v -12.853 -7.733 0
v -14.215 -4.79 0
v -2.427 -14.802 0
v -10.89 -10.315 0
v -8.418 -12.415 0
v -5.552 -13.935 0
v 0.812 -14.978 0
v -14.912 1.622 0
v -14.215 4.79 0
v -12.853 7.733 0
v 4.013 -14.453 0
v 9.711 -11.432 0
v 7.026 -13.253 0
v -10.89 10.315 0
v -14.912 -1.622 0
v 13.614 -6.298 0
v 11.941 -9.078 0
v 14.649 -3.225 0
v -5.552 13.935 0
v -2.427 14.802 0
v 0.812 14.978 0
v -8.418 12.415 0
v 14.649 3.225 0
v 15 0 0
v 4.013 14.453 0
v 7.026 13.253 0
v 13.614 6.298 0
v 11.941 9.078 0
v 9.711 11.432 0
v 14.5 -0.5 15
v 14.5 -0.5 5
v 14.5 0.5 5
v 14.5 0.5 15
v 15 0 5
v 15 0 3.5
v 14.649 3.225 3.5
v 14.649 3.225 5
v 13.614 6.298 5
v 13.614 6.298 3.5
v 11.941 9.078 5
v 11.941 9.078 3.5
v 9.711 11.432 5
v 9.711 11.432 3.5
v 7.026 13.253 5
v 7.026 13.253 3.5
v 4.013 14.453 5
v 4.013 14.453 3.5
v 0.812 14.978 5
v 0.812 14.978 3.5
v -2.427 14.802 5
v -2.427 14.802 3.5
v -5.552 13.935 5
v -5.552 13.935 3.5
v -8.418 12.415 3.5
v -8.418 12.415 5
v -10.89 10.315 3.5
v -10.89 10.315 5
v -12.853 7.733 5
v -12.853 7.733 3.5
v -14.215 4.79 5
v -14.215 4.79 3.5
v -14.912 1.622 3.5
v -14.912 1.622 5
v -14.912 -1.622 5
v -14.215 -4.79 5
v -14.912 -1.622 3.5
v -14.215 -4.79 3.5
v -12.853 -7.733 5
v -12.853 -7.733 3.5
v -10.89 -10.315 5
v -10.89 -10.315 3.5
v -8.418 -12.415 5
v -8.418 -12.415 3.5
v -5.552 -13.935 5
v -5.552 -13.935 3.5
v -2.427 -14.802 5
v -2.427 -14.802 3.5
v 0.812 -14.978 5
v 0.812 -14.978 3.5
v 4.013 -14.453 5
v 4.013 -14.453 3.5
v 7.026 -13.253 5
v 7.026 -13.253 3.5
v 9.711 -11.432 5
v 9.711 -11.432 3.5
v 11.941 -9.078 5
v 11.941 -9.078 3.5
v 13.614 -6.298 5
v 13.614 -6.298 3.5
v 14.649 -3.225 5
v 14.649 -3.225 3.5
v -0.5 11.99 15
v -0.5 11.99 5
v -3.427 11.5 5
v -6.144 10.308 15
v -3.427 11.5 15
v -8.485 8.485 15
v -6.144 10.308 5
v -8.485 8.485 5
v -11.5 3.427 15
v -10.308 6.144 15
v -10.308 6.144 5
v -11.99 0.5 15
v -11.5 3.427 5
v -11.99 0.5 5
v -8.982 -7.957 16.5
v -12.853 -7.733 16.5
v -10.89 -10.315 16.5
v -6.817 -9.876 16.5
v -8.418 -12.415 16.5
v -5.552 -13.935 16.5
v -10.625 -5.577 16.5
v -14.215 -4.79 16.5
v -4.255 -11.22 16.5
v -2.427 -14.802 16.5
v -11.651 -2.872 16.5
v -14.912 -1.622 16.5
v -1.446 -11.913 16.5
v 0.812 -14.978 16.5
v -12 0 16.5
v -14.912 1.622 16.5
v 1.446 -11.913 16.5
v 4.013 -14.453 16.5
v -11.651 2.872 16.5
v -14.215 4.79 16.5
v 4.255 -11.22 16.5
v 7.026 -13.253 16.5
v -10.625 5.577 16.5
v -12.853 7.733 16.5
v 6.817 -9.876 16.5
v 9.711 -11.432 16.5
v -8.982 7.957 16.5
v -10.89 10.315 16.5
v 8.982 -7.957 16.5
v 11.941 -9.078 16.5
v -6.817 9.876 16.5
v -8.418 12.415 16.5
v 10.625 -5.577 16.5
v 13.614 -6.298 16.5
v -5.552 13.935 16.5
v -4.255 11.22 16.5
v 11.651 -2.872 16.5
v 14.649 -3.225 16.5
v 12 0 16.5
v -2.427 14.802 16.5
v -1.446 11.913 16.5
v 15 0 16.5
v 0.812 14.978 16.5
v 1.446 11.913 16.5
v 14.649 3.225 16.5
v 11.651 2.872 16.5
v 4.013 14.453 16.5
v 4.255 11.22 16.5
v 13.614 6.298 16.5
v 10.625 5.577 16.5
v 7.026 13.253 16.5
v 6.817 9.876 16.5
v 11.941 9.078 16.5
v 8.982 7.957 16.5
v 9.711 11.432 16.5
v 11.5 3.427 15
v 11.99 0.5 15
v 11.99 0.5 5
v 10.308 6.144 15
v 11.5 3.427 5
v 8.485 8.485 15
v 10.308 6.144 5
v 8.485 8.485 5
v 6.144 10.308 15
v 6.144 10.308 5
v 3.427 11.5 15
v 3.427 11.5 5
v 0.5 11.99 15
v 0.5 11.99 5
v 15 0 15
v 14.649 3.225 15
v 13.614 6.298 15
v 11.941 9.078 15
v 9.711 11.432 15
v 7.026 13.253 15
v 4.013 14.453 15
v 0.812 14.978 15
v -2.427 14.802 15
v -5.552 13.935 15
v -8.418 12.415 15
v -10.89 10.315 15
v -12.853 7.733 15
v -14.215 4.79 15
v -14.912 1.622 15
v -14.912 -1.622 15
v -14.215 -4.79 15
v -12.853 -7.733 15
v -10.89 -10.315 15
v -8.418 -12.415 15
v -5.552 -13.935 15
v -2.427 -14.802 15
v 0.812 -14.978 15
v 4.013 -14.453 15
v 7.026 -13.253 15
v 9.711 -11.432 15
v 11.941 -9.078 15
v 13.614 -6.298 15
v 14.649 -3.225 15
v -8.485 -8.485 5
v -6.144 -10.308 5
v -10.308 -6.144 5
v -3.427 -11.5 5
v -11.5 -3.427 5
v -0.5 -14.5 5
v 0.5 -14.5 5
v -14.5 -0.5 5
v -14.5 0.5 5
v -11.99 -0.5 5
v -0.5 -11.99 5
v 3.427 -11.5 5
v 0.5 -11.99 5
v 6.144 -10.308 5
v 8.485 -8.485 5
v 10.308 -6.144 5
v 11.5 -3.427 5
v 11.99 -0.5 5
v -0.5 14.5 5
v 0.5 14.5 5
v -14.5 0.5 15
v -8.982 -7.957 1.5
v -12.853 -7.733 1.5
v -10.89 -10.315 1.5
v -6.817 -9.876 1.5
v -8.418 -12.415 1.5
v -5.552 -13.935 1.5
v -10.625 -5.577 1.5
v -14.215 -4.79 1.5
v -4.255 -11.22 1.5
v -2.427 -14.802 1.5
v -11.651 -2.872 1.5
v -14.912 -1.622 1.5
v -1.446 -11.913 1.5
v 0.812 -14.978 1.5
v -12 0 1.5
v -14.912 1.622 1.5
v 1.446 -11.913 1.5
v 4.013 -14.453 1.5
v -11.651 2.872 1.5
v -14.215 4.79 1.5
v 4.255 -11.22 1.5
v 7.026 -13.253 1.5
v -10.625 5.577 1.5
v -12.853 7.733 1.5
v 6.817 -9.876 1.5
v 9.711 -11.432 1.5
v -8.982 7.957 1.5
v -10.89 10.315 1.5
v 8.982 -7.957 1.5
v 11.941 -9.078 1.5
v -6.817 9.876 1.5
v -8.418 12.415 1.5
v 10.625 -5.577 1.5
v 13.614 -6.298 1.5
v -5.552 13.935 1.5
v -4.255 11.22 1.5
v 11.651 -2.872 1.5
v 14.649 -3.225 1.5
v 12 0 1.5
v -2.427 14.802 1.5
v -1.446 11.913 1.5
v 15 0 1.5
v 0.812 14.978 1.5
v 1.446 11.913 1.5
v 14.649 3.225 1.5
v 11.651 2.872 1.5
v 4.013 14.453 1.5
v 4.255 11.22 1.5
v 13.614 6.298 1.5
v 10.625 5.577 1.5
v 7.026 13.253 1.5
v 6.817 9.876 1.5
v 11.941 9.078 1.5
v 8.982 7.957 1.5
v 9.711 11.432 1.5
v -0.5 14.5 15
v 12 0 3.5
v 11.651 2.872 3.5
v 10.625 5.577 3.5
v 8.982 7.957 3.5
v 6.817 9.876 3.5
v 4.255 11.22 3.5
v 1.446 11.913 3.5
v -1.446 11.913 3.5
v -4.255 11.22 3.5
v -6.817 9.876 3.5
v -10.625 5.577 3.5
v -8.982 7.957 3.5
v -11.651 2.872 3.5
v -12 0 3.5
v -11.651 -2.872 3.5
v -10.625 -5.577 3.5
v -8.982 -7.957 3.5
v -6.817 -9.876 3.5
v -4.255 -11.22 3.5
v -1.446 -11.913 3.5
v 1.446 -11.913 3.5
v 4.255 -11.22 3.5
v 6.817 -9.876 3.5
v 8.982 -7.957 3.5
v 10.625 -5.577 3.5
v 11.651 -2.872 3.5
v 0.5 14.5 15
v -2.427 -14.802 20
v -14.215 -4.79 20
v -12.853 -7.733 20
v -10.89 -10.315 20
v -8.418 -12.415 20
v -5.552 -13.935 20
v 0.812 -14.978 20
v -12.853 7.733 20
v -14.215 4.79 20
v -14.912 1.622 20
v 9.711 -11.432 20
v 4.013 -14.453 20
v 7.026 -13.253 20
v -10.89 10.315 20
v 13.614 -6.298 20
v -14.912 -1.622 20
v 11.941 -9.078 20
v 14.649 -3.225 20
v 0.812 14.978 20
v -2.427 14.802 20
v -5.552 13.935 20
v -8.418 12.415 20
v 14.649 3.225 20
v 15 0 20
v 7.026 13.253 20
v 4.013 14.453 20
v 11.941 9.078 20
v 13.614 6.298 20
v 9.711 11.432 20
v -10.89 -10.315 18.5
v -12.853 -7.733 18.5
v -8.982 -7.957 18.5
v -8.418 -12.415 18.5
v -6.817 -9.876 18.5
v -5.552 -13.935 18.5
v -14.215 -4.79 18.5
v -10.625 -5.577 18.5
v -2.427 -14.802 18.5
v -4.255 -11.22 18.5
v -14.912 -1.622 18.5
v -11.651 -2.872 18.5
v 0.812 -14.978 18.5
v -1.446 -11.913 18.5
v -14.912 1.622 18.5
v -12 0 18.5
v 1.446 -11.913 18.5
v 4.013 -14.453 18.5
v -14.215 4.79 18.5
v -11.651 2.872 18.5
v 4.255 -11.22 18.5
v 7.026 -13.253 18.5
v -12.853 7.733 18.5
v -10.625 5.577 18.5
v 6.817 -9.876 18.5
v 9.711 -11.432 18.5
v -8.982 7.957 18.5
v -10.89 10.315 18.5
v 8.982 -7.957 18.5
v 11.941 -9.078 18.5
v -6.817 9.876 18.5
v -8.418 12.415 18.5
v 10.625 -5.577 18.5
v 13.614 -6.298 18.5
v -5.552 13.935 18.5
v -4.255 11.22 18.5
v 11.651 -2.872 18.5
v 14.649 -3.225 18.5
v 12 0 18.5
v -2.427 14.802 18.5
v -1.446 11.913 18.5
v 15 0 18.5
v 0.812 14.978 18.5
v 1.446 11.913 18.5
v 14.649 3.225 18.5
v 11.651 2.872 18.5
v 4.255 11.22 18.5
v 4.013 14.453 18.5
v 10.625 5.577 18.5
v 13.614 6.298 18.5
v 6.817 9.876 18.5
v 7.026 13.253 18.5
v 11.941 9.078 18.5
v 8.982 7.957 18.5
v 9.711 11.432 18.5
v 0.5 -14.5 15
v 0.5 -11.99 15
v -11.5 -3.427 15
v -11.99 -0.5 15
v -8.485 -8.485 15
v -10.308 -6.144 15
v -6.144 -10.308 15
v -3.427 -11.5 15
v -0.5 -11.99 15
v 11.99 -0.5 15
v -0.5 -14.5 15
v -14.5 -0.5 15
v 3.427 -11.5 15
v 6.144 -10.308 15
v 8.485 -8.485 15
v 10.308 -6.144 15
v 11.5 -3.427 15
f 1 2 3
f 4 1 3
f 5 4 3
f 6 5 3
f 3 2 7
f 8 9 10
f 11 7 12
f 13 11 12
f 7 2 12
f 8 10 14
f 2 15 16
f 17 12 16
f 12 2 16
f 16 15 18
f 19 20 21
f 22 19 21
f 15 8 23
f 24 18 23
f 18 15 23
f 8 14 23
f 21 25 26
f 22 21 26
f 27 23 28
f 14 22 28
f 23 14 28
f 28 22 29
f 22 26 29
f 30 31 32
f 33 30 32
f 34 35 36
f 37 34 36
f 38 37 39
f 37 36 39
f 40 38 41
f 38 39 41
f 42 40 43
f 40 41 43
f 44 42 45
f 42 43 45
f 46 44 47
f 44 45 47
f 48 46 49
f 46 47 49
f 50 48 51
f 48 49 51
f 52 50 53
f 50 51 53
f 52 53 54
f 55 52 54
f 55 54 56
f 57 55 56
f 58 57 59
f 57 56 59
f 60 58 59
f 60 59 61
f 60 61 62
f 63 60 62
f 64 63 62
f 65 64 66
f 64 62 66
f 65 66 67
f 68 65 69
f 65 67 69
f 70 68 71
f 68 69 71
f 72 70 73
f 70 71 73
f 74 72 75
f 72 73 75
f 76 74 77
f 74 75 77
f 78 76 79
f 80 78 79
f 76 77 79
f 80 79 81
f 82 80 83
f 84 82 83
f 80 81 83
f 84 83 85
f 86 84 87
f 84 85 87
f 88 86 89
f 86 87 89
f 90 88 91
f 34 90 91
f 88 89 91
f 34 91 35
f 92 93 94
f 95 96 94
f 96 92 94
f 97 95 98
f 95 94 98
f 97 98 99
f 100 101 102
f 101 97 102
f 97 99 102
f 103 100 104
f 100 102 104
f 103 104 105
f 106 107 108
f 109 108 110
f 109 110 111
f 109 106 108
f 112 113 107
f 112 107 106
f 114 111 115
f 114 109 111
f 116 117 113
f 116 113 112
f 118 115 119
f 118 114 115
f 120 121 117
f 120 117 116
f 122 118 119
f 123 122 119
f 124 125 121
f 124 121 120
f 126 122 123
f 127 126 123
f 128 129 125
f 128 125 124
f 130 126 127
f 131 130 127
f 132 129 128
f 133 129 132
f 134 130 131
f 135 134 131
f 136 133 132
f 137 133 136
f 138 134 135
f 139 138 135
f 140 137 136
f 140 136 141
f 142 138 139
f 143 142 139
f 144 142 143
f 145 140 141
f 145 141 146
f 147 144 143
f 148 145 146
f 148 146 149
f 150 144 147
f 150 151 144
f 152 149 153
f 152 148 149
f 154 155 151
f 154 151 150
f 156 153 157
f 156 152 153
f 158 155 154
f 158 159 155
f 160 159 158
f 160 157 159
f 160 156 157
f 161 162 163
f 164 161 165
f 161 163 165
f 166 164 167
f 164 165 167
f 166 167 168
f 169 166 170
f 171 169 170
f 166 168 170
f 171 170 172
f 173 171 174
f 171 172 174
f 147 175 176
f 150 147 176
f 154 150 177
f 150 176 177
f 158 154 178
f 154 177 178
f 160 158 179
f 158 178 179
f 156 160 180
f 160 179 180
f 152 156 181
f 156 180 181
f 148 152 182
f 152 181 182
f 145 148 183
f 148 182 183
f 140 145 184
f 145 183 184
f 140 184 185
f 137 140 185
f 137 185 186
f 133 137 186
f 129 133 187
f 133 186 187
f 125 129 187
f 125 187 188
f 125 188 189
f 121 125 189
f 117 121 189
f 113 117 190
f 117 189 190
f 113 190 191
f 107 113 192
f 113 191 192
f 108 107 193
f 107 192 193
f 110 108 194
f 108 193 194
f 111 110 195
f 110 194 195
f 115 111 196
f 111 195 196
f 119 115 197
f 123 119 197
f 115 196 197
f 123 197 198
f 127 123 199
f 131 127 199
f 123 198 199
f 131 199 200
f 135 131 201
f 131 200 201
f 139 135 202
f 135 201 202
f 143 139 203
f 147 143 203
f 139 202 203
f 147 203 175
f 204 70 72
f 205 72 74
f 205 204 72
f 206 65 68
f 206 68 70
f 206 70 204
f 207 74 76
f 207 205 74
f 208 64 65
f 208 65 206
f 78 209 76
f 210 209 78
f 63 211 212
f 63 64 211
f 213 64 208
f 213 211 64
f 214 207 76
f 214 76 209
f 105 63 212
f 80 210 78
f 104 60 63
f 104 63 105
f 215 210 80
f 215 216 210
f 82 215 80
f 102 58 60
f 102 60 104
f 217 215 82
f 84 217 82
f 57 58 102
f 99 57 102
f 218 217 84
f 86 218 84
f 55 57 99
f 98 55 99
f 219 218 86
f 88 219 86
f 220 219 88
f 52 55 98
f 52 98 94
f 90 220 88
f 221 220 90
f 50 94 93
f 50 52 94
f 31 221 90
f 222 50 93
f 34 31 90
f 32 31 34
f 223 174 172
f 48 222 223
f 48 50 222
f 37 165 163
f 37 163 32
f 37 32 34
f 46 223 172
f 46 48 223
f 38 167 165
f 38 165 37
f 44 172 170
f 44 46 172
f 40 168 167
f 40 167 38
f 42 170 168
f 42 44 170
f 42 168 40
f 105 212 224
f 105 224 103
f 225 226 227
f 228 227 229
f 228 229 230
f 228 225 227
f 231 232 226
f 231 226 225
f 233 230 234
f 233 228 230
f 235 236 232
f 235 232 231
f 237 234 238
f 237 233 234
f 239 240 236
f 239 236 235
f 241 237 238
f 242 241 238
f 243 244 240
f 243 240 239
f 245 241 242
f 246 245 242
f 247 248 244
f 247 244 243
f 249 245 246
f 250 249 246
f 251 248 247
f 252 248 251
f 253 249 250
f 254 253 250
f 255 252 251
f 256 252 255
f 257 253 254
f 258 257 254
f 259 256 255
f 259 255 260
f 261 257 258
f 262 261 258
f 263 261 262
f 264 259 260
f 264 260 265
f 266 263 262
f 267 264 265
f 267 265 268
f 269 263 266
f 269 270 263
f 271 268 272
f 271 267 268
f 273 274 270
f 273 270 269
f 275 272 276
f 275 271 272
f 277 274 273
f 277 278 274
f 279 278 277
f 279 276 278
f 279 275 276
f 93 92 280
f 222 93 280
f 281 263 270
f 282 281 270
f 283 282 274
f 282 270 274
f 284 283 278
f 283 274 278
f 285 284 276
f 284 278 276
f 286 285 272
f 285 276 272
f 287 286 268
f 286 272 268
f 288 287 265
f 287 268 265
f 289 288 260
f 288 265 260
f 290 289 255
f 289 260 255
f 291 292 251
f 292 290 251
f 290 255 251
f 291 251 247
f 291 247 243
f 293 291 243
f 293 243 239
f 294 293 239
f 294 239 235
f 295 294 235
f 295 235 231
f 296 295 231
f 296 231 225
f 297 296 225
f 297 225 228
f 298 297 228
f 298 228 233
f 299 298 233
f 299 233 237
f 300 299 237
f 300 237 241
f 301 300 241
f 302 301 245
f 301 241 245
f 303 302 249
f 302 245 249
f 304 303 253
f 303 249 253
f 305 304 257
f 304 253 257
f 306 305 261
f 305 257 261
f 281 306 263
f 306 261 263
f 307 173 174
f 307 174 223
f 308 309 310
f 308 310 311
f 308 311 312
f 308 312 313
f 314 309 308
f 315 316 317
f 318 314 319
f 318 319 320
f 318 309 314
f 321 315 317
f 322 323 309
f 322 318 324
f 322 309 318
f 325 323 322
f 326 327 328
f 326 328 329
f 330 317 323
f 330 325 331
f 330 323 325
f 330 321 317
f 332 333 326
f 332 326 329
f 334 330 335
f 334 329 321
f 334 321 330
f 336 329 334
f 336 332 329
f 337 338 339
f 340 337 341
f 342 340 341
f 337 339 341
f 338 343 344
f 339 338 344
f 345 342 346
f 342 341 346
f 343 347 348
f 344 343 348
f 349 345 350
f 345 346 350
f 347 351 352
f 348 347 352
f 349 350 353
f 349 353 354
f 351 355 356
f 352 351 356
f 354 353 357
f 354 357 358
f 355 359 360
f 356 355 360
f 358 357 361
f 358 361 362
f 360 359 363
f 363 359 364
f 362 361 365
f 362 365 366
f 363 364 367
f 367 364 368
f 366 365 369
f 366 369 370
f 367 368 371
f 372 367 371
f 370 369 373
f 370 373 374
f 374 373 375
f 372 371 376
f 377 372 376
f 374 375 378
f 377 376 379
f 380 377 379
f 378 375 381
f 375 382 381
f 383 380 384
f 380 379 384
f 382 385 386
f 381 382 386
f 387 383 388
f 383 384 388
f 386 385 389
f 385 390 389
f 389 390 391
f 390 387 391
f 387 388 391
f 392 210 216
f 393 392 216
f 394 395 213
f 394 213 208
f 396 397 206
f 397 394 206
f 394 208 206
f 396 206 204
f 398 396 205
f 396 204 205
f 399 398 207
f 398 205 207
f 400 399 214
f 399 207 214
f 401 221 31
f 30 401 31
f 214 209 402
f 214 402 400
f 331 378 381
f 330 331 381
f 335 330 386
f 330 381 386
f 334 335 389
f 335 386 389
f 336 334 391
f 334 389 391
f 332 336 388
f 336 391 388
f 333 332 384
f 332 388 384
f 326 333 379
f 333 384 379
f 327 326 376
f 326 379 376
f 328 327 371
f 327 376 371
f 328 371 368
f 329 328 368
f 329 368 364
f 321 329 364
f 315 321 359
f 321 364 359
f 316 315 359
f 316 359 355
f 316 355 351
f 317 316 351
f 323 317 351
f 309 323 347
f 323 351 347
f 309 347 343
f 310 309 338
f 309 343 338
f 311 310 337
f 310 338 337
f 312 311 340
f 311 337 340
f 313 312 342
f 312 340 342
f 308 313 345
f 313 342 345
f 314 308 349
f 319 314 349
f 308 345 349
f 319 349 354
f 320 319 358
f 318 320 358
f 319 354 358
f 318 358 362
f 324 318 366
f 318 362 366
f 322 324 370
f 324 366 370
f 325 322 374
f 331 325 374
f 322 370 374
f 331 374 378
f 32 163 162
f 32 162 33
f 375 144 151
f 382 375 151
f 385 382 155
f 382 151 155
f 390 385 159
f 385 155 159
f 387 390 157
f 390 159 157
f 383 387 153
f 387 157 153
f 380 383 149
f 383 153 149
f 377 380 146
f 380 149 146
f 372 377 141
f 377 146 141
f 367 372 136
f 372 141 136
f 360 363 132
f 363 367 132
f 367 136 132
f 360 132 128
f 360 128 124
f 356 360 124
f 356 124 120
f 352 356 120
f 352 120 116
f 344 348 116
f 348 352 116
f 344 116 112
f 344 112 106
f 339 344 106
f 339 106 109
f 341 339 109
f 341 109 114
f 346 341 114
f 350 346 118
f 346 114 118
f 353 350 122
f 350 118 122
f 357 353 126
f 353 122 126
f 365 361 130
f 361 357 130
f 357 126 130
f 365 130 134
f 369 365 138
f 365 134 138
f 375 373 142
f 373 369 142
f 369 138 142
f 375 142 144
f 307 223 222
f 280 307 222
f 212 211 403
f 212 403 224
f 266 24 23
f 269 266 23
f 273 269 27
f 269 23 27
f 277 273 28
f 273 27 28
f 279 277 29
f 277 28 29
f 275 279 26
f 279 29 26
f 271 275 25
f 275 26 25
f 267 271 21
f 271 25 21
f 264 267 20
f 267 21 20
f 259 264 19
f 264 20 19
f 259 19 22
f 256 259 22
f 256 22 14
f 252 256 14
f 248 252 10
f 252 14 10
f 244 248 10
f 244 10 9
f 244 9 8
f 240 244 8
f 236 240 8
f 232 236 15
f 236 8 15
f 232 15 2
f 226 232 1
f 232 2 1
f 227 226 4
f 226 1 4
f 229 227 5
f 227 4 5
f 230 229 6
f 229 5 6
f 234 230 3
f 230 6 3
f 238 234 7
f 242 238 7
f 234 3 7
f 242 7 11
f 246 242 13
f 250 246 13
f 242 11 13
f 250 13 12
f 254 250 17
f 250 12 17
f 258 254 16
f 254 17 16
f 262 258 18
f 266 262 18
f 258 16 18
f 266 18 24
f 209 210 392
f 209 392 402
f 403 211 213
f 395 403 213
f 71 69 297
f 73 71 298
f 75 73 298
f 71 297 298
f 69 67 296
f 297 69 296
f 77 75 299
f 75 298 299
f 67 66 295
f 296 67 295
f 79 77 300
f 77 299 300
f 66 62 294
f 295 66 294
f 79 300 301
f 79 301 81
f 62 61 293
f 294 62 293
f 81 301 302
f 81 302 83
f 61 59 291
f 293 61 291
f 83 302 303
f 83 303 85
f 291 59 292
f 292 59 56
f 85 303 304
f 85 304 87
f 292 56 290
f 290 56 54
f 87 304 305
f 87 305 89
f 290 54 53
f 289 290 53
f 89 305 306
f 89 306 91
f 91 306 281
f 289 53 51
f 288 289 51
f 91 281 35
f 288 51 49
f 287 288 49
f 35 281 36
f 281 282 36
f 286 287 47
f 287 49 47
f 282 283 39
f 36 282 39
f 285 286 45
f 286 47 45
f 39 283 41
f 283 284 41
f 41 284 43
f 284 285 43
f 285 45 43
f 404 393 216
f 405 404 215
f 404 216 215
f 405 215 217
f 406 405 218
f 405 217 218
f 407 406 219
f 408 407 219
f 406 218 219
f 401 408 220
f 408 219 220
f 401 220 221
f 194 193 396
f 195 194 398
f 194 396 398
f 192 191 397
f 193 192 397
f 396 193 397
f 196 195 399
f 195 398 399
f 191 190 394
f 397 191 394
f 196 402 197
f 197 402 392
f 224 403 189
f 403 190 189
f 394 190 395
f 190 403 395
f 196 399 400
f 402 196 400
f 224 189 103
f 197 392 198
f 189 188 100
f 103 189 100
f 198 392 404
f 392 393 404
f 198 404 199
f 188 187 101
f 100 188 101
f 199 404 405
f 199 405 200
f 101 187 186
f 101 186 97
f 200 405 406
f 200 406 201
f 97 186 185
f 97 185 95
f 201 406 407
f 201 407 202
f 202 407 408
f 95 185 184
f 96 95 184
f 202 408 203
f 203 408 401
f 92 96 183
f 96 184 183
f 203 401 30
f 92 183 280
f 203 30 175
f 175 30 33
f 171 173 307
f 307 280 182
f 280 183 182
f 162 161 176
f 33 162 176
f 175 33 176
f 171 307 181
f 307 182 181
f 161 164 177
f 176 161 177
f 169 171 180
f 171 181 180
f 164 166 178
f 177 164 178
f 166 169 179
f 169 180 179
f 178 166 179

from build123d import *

# Parameters (mm, degrees)
CYLINDER_R               = 12
CYLINDER_DEPTH           = 20
CYLINDER001_R            = 15
CYLINDER001_DEPTH        = 1.5
CYLINDER002_R            = 15
CYLINDER002_DEPTH        = 1.5
CYLINDER003_R            = 15
CYLINDER003_DEPTH        = 1.5
CYLINDER004_R            = 15
CYLINDER004_DEPTH        = 1.5
BOX_W                    = 29
BOX_H                    = 1
BOX_DEPTH                = 10
BOX001_W                 = 29
BOX001_H                 = 1
BOX001_DEPTH             = 10
COMPOUND_PLACEMENT_ANGLE = 90


with BuildPart() as cylinder:
    # Cylinder → Cylinder (new body)
    with BuildSketch(Plane.XY):
        Circle(CYLINDER_R)
    extrude(amount=CYLINDER_DEPTH)


with BuildPart() as cylinder001:
    # Cylinder001 → Cylinder001 (new body)
    with BuildSketch(Plane.XY):
        Circle(CYLINDER001_R)
    extrude(amount=CYLINDER001_DEPTH)


with BuildPart() as cylinder002:
    # Cylinder002 → Cylinder002 (new body)
    with BuildSketch(Plane.XY.offset(3.5)):
        Circle(CYLINDER002_R)
    extrude(amount=CYLINDER002_DEPTH)


with BuildPart() as cylinder003:
    # Cylinder003 → Cylinder003 (new body)
    with BuildSketch(Plane.XY.offset(18.5)):
        Circle(CYLINDER003_R)
    extrude(amount=CYLINDER003_DEPTH)


with BuildPart() as cylinder004:
    # Cylinder004 → Cylinder004 (new body)
    with BuildSketch(Plane.XY.offset(15)):
        Circle(CYLINDER004_R)
    extrude(amount=CYLINDER004_DEPTH)


with BuildPart() as cube:
    # Box → Box (new body)
    with BuildSketch(Plane(origin=(-14.5, -0.5, 5), x_dir=(1, 0, 0), z_dir=(0, 0, 1))):
        with Locations((14.5, 0.5)):
            Rectangle(BOX_W, BOX_H)
    extrude(amount=BOX_DEPTH)


with BuildPart() as basewheel_hollowsides:
    # Box001 → Box001 (new body)
    with BuildSketch(Plane(origin=(-14.5, -0.5, 5), x_dir=(1, 0, 0), z_dir=(0, 0, 1))):
        with Locations((14.5, 0.5)):
            Rectangle(BOX001_W, BOX001_H)
    extrude(amount=BOX001_DEPTH)


with BuildPart() as basewheel_hollowsides_1:
    # Compound placement: moved
    add(basewheel_hollowsides.part.rotate(Axis((0, 0, 0), (0, 0, 1)), COMPOUND_PLACEMENT_ANGLE))

    # Fusion: union Cylinder, Cylinder001, Cylinder002, Cylinder003, Cylinder004, Cube
    add(cylinder.part)
    add(cylinder001.part)
    add(cylinder002.part)
    add(cylinder003.part)
    add(cylinder004.part)
    add(cube.part)


solid = basewheel_hollowsides_1.part
